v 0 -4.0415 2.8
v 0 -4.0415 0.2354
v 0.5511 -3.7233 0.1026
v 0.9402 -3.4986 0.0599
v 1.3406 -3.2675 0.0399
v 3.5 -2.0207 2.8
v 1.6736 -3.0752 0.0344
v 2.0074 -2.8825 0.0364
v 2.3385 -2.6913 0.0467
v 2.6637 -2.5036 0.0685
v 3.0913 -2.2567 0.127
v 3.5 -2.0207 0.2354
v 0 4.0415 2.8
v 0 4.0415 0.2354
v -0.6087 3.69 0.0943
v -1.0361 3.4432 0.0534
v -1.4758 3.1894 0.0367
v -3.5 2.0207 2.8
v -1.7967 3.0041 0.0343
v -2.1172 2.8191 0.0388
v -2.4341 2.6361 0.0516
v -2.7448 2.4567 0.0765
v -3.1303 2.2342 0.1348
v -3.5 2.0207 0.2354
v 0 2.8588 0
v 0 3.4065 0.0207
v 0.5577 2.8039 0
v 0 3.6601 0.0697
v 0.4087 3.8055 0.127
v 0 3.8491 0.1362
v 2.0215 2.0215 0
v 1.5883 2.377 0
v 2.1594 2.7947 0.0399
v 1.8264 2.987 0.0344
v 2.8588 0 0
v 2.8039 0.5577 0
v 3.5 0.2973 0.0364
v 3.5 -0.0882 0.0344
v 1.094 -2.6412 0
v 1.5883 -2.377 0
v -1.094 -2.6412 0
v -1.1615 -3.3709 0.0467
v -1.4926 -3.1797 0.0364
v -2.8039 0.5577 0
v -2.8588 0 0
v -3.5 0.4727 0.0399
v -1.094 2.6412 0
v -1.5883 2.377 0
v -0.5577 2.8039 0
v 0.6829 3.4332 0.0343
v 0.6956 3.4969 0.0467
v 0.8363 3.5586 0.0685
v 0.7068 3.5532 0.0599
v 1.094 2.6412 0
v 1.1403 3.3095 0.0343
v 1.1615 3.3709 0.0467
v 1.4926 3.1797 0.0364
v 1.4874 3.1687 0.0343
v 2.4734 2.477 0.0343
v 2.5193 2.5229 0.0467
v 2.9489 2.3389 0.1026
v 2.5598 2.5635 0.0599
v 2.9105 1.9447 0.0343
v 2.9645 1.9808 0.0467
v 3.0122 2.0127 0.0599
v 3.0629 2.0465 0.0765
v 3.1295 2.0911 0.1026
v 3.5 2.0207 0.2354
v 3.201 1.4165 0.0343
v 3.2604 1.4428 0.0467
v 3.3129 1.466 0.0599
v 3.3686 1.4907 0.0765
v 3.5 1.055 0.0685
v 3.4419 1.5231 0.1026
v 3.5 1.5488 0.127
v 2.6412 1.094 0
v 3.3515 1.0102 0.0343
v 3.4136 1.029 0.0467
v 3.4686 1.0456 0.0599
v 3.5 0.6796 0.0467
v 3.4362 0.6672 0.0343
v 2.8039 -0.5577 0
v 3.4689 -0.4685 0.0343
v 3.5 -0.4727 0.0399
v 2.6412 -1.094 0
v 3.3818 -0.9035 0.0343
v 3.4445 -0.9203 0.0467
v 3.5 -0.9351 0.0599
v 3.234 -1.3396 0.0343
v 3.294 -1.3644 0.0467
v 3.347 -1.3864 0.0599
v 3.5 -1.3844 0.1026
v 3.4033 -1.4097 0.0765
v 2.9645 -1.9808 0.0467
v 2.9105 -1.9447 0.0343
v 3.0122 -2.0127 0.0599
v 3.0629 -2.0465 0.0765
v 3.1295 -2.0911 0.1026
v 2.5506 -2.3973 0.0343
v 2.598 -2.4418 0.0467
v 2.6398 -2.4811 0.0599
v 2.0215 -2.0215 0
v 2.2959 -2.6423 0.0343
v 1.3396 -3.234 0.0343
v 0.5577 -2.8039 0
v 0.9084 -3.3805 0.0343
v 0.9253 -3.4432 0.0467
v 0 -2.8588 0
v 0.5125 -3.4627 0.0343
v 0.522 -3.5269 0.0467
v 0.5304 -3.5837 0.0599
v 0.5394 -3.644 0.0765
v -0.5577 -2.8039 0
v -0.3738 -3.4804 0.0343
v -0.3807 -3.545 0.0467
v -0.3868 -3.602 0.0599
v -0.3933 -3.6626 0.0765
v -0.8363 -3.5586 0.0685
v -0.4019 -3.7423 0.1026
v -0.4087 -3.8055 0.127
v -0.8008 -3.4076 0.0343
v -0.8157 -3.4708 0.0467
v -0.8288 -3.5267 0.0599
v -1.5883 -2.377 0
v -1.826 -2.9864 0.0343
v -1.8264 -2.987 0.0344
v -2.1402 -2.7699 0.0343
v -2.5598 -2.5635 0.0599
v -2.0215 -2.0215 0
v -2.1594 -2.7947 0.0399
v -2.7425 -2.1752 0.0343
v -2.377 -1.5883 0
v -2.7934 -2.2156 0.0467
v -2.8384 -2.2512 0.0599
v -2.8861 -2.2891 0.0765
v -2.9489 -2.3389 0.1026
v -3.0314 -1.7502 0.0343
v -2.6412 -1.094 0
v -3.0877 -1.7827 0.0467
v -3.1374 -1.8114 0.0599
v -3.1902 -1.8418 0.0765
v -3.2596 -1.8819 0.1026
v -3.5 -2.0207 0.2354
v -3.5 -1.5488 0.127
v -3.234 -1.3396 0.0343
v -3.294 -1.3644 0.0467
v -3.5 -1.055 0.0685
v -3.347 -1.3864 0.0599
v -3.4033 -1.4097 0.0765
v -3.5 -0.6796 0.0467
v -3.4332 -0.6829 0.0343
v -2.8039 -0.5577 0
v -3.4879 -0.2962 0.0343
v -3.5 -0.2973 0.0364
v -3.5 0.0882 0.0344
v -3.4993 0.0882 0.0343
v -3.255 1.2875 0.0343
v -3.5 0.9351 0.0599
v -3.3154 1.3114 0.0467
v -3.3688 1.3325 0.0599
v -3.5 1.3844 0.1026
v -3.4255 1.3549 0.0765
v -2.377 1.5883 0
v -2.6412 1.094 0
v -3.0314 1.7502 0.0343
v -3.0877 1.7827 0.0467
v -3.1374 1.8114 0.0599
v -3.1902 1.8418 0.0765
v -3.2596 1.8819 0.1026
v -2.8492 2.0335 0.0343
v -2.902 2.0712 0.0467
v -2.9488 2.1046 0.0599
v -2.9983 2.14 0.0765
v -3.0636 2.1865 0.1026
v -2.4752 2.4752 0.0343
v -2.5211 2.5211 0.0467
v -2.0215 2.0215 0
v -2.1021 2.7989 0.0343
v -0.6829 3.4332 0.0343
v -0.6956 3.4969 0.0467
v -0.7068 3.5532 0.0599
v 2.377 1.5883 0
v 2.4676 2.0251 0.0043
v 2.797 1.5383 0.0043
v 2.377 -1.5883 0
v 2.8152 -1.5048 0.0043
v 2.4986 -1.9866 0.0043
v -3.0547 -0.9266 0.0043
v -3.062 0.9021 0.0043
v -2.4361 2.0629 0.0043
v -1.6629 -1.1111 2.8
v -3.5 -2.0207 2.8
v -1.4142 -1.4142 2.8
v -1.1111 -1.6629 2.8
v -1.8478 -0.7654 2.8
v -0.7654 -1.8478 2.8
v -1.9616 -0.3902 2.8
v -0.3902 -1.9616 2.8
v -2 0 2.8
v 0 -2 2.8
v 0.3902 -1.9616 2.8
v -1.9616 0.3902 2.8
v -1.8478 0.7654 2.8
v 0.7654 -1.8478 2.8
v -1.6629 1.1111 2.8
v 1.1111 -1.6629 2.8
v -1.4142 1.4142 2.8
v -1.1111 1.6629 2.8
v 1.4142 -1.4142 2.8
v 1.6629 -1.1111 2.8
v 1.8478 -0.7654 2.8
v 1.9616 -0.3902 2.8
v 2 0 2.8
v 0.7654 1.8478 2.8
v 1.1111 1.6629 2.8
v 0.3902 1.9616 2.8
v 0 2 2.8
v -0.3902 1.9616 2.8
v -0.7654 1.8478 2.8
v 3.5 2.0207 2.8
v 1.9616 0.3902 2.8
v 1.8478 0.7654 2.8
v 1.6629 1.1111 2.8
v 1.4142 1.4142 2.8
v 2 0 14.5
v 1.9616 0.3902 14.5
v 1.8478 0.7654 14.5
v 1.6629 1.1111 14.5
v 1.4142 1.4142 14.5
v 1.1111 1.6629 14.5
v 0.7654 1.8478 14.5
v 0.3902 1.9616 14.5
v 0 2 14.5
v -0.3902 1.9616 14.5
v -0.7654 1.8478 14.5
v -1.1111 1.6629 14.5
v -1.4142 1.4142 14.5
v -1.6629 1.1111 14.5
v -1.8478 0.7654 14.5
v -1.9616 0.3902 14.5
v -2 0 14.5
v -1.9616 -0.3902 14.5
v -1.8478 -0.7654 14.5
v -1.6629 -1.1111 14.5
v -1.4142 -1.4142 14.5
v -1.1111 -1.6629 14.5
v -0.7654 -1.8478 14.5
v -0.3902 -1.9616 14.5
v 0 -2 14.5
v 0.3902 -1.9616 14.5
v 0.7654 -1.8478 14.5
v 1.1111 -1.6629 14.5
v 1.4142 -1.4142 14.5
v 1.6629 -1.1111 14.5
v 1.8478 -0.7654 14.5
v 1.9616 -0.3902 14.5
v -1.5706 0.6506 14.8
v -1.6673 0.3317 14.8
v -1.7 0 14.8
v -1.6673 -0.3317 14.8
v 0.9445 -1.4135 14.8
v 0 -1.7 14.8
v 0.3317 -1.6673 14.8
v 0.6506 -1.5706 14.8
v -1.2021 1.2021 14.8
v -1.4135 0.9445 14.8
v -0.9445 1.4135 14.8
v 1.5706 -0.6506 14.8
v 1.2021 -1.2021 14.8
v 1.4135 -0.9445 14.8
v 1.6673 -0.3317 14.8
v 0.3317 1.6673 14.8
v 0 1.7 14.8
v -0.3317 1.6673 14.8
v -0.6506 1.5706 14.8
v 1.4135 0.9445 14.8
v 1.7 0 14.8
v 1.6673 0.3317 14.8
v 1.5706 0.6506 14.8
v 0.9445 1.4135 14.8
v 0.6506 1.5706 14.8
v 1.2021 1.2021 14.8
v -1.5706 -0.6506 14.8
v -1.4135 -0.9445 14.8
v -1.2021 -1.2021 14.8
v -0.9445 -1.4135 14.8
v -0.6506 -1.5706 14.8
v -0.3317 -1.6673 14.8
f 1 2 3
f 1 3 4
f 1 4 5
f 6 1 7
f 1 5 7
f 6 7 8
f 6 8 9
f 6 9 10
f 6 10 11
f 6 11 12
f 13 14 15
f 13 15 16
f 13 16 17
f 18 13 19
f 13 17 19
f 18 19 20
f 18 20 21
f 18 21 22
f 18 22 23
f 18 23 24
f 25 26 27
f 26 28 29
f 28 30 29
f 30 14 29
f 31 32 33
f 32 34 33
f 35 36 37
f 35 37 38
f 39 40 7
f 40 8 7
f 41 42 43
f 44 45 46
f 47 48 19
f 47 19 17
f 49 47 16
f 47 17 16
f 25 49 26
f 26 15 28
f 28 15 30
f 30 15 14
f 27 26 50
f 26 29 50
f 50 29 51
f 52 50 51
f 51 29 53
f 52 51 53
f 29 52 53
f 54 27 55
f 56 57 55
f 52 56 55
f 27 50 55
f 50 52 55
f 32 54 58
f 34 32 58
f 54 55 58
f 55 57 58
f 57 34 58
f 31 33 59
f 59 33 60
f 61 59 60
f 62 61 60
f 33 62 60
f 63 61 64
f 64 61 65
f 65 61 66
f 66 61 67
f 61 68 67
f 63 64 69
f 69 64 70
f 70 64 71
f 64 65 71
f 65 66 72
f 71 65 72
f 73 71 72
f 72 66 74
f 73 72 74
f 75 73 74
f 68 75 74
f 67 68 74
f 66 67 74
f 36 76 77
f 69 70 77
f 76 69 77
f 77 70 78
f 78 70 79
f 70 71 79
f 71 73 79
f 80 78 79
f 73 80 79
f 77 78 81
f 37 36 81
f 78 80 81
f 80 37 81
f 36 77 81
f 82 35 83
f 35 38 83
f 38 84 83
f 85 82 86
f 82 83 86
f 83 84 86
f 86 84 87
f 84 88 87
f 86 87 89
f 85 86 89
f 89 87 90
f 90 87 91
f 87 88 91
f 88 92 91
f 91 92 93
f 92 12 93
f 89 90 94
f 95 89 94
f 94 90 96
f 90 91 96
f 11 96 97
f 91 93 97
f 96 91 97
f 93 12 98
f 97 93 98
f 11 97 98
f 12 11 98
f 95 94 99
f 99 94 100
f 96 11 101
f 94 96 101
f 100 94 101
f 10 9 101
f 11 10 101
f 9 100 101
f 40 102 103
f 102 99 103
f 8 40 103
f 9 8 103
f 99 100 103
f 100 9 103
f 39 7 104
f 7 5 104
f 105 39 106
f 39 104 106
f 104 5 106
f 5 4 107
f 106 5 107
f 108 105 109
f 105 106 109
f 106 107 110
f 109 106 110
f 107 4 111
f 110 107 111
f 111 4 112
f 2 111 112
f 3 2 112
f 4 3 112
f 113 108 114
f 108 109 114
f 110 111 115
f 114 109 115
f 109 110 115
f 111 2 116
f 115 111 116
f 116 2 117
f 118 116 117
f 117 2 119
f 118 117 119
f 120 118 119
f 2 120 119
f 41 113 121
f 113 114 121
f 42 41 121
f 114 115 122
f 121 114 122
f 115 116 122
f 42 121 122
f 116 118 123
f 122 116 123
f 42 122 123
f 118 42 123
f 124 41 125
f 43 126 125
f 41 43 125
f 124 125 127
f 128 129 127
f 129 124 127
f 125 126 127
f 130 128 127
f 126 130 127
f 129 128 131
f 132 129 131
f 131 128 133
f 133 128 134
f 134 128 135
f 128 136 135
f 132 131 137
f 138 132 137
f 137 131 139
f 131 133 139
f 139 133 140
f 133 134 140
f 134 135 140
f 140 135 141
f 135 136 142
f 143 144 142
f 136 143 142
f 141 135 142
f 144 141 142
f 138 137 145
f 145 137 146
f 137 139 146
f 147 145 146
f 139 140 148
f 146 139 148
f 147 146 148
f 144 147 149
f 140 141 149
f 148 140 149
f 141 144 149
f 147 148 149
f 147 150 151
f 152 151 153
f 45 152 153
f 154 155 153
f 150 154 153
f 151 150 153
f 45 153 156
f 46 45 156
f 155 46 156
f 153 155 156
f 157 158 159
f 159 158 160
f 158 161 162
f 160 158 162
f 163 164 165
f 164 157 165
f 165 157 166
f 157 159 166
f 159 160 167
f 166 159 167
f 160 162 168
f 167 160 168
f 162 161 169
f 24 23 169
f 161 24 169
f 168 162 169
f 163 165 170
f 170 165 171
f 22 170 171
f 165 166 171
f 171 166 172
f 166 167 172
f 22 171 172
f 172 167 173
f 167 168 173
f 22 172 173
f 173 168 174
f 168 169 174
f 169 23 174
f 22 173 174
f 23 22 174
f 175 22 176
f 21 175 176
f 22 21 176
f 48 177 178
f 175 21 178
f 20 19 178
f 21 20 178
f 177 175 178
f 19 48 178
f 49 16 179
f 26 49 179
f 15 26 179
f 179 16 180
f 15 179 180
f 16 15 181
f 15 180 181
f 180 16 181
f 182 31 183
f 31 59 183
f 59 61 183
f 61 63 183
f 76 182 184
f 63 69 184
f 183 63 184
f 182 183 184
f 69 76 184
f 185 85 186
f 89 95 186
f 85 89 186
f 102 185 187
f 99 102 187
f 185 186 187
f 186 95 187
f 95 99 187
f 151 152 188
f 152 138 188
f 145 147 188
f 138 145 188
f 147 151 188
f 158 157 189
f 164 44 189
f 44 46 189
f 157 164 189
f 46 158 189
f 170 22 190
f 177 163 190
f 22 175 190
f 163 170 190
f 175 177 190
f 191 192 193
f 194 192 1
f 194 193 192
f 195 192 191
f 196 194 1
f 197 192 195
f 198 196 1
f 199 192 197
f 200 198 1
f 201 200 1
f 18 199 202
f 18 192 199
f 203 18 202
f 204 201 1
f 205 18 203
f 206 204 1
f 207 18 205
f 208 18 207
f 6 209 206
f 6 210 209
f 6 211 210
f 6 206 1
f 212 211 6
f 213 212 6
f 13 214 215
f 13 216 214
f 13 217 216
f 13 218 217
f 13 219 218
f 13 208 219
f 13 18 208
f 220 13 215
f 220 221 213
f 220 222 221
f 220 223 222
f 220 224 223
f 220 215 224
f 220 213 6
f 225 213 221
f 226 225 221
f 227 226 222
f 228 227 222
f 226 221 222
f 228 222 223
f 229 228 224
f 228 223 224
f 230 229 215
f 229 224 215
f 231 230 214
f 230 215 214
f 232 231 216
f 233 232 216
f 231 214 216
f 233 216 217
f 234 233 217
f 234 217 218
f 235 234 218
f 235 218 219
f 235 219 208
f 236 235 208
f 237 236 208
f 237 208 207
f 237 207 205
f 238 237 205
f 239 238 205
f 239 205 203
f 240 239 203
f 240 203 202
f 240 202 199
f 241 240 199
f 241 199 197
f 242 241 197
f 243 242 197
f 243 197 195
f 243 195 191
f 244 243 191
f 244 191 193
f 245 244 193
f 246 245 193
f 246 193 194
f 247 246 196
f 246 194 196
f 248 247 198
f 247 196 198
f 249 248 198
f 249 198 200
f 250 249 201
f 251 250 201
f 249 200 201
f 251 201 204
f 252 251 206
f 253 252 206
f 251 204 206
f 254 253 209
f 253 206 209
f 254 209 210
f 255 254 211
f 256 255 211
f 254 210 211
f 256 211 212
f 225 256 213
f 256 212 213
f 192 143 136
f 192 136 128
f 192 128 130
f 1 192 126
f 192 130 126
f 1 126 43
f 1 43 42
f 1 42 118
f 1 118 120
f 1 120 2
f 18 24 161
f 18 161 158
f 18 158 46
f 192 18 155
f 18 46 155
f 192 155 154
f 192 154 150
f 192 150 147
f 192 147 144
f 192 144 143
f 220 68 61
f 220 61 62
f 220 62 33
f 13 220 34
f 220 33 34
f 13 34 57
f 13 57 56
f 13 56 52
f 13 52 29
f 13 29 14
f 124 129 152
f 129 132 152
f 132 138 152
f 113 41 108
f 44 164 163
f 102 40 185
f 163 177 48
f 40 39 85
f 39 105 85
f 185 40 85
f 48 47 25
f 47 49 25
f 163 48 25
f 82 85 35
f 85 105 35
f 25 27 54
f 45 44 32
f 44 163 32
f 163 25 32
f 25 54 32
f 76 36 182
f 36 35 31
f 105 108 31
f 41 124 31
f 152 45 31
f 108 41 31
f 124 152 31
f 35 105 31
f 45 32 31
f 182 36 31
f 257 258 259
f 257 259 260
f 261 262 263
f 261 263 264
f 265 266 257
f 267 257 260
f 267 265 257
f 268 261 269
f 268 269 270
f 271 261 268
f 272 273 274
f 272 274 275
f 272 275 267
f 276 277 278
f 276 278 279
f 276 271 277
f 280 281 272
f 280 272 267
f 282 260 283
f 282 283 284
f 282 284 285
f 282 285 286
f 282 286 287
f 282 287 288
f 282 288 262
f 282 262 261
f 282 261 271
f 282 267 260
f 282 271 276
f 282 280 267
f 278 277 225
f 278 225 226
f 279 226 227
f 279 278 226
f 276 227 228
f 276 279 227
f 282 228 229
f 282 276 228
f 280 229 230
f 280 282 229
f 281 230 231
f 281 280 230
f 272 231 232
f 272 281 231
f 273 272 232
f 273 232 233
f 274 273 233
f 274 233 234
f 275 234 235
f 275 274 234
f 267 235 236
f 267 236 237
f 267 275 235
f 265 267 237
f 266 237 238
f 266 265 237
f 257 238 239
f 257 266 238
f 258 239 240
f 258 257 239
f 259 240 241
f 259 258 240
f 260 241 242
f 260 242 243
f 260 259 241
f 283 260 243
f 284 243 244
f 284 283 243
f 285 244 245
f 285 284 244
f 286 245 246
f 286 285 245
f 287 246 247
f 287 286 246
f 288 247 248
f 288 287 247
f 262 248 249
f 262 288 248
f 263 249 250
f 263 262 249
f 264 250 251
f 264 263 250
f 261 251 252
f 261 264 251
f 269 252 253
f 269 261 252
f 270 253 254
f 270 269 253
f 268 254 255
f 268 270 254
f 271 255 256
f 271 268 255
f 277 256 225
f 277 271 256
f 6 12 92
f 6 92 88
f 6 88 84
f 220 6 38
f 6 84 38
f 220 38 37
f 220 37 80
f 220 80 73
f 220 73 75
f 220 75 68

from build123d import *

# Parameters (mm, degrees)
F0_R     = 2
F1_DEPTH = 14.8
F2_DEPTH = 2.8
F5_SIZE  = 0.3


with BuildPart() as f1:
    # F0 (on Top) → F1 (new body)
    with BuildSketch(Plane.XY):
        Circle(F0_R)
    extrude(amount=F1_DEPTH)

    # F0 (on Top) → F2 (join)
    with BuildSketch(Plane.XY):
        Polygon((3.5, 2.020726), (0, 4.041452), (-3.5, 2.020726), (-3.5, -2.020726), (0, -4.041452), (3.5, -2.020726), align=None)
        Circle(F0_R, mode=Mode.SUBTRACT)
    extrude(amount=F2_DEPTH)

    # F3 (on Right) → F4 (revolve, cut)
    with BuildSketch(Plane.YZ):
        with BuildLine():
            add(Edge.make_bspline(
                [(2.858781, 0), (3.303965, 0), (3.651425, 0), (4.042318, 0.235874)],
                knots=[0, 0, 0, 0, 1.206813, 1.206813, 1.206813, 1.206813], degree=3))
            Line((2.858781, 0), (4.043203, 0))
            Line((4.043203, 0), (4.042318, 0.235874))
        make_face()
    revolve(axis=Axis((0, 0, 0), (0, 0, -1)), mode=Mode.SUBTRACT)

    # F5
    f5_edges = [f1.edges().sort_by_distance(p)[0] for p in [
        (-2, 0, 14.8),
    ]]
    chamfer(f5_edges, length=F5_SIZE)


solid = f1.part
